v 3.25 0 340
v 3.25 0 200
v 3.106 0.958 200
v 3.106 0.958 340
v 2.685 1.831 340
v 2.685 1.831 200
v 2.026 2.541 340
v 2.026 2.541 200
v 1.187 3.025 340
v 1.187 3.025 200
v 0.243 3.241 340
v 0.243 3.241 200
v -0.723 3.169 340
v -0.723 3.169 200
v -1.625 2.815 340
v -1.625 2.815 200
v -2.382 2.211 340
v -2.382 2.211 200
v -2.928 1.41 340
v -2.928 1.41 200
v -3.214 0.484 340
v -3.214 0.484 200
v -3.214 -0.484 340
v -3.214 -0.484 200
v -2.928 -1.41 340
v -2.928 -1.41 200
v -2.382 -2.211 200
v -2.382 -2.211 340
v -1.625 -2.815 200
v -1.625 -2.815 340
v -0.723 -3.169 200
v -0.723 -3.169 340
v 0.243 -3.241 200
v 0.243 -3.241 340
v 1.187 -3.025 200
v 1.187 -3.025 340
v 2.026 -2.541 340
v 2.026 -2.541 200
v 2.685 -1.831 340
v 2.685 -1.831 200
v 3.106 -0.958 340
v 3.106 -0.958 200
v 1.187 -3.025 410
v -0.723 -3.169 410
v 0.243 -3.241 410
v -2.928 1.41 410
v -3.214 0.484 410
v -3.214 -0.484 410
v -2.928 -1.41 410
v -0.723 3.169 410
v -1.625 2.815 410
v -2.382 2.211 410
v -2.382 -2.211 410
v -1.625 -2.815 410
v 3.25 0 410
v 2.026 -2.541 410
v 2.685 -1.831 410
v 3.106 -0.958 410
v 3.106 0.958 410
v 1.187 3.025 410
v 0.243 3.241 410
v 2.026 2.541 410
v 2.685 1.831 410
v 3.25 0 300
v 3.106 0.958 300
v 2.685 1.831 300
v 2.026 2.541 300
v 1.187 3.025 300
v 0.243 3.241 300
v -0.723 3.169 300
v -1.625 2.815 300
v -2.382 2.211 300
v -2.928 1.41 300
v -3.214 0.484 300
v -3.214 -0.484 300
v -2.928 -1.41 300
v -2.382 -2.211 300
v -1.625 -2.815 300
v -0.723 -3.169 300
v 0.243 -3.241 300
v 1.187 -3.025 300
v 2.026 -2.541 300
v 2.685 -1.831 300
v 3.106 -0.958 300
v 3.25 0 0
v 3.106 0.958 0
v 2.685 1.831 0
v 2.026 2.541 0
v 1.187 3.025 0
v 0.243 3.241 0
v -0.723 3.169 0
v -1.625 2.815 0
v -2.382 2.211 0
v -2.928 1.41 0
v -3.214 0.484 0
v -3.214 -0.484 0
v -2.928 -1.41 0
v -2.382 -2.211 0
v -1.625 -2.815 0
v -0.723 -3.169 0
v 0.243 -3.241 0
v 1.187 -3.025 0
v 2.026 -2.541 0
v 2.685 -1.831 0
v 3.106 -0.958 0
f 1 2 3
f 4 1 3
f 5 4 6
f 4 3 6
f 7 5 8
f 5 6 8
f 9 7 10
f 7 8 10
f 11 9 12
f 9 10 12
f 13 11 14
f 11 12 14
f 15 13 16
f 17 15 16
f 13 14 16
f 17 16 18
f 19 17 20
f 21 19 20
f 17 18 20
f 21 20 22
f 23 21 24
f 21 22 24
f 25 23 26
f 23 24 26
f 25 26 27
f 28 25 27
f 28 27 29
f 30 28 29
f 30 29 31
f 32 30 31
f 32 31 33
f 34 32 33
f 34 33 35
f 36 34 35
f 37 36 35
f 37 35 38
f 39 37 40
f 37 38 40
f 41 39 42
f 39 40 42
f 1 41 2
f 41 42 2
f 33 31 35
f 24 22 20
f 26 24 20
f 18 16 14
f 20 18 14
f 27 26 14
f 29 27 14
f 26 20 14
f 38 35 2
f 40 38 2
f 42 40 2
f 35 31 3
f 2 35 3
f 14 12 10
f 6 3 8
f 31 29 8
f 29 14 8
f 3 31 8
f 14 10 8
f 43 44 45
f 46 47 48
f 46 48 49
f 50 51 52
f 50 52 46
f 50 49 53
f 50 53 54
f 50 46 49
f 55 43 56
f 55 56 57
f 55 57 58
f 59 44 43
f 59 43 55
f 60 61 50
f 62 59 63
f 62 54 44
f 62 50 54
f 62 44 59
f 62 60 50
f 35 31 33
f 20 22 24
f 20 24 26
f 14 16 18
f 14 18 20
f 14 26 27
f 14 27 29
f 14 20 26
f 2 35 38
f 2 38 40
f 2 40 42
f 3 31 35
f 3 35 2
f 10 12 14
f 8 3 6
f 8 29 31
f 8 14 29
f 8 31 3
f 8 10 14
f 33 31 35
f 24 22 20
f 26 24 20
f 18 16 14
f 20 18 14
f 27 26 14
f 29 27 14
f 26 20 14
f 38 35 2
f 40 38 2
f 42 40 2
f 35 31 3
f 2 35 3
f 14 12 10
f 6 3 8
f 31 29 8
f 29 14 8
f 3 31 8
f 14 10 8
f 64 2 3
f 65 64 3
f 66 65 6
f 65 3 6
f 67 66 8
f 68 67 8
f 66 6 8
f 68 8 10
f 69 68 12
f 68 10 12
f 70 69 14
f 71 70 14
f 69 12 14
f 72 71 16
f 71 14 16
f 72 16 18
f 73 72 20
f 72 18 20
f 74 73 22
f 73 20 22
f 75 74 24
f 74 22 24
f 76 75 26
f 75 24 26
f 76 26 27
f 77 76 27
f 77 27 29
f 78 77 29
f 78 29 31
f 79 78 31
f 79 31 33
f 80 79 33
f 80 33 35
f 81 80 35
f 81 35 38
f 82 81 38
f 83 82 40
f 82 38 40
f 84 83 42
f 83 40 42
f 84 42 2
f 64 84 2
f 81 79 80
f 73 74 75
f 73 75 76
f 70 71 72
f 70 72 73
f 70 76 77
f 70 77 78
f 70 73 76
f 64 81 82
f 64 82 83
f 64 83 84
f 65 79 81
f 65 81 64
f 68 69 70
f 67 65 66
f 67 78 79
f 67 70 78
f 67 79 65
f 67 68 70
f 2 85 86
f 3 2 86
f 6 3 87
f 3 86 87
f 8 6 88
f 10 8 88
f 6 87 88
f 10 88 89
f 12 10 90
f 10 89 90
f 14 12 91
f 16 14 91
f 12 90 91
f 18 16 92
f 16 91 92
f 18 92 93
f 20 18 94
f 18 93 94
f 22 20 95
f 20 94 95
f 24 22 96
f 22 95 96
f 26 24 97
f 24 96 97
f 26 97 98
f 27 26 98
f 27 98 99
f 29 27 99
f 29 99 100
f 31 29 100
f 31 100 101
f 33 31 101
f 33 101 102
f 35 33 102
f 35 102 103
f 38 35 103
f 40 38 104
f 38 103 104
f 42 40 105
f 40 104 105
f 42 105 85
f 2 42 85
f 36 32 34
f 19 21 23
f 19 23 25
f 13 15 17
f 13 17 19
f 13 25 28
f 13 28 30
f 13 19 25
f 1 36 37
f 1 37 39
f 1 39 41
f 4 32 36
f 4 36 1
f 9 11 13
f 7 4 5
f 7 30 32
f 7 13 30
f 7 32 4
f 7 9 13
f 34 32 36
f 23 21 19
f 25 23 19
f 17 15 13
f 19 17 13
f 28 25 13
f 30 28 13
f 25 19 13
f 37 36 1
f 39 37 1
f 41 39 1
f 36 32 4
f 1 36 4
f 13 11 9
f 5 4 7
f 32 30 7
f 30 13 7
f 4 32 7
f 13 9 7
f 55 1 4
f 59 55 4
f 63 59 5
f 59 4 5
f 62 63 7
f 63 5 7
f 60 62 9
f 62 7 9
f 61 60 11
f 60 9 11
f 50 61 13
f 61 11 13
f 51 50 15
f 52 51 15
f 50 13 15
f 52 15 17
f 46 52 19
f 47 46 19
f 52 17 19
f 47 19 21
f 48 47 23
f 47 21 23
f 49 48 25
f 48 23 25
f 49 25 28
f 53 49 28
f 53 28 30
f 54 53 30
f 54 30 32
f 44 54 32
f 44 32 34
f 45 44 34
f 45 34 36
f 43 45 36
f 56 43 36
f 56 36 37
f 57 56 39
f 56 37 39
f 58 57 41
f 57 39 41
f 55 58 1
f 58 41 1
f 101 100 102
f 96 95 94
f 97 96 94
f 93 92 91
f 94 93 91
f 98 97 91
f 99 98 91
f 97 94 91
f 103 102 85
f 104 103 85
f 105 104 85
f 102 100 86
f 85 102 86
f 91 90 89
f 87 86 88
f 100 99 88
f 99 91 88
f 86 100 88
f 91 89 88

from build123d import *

# Parameters (mm, degrees)
F0_R     = 3.25
F1_DEPTH = 200
F2_DEPTH = 100
F3_DEPTH = 140
F4_DEPTH = 70


with BuildPart() as f1:
    # F0 (on Top) → F1 (new body)
    with BuildSketch(Plane.XY):
        Circle(F0_R)
    extrude(amount=F1_DEPTH)


with BuildPart() as f2:
    # F2 (new): a face of the model
    f2_faces = [f1.part.faces().sort_by_distance(p)[0] for p in [
        (0, 0, 200),
    ]]
    extrude(f2_faces, amount=F2_DEPTH)


with BuildPart() as f3:
    # F3 (new): a face of the model
    f3_faces = [f1.part.faces().sort_by_distance(p)[0] for p in [
        (0, 0, 200),
    ]]
    extrude(f3_faces, amount=F3_DEPTH)


with BuildPart() as f4:
    # F4 (new): a face of the model
    f4_faces = [f3.part.faces().sort_by_distance(p)[0] for p in [
        (0, 0, 340),
    ]]
    extrude(f4_faces, amount=F4_DEPTH)


solid = Compound([f1.part, f2.part, f3.part, f4.part])
